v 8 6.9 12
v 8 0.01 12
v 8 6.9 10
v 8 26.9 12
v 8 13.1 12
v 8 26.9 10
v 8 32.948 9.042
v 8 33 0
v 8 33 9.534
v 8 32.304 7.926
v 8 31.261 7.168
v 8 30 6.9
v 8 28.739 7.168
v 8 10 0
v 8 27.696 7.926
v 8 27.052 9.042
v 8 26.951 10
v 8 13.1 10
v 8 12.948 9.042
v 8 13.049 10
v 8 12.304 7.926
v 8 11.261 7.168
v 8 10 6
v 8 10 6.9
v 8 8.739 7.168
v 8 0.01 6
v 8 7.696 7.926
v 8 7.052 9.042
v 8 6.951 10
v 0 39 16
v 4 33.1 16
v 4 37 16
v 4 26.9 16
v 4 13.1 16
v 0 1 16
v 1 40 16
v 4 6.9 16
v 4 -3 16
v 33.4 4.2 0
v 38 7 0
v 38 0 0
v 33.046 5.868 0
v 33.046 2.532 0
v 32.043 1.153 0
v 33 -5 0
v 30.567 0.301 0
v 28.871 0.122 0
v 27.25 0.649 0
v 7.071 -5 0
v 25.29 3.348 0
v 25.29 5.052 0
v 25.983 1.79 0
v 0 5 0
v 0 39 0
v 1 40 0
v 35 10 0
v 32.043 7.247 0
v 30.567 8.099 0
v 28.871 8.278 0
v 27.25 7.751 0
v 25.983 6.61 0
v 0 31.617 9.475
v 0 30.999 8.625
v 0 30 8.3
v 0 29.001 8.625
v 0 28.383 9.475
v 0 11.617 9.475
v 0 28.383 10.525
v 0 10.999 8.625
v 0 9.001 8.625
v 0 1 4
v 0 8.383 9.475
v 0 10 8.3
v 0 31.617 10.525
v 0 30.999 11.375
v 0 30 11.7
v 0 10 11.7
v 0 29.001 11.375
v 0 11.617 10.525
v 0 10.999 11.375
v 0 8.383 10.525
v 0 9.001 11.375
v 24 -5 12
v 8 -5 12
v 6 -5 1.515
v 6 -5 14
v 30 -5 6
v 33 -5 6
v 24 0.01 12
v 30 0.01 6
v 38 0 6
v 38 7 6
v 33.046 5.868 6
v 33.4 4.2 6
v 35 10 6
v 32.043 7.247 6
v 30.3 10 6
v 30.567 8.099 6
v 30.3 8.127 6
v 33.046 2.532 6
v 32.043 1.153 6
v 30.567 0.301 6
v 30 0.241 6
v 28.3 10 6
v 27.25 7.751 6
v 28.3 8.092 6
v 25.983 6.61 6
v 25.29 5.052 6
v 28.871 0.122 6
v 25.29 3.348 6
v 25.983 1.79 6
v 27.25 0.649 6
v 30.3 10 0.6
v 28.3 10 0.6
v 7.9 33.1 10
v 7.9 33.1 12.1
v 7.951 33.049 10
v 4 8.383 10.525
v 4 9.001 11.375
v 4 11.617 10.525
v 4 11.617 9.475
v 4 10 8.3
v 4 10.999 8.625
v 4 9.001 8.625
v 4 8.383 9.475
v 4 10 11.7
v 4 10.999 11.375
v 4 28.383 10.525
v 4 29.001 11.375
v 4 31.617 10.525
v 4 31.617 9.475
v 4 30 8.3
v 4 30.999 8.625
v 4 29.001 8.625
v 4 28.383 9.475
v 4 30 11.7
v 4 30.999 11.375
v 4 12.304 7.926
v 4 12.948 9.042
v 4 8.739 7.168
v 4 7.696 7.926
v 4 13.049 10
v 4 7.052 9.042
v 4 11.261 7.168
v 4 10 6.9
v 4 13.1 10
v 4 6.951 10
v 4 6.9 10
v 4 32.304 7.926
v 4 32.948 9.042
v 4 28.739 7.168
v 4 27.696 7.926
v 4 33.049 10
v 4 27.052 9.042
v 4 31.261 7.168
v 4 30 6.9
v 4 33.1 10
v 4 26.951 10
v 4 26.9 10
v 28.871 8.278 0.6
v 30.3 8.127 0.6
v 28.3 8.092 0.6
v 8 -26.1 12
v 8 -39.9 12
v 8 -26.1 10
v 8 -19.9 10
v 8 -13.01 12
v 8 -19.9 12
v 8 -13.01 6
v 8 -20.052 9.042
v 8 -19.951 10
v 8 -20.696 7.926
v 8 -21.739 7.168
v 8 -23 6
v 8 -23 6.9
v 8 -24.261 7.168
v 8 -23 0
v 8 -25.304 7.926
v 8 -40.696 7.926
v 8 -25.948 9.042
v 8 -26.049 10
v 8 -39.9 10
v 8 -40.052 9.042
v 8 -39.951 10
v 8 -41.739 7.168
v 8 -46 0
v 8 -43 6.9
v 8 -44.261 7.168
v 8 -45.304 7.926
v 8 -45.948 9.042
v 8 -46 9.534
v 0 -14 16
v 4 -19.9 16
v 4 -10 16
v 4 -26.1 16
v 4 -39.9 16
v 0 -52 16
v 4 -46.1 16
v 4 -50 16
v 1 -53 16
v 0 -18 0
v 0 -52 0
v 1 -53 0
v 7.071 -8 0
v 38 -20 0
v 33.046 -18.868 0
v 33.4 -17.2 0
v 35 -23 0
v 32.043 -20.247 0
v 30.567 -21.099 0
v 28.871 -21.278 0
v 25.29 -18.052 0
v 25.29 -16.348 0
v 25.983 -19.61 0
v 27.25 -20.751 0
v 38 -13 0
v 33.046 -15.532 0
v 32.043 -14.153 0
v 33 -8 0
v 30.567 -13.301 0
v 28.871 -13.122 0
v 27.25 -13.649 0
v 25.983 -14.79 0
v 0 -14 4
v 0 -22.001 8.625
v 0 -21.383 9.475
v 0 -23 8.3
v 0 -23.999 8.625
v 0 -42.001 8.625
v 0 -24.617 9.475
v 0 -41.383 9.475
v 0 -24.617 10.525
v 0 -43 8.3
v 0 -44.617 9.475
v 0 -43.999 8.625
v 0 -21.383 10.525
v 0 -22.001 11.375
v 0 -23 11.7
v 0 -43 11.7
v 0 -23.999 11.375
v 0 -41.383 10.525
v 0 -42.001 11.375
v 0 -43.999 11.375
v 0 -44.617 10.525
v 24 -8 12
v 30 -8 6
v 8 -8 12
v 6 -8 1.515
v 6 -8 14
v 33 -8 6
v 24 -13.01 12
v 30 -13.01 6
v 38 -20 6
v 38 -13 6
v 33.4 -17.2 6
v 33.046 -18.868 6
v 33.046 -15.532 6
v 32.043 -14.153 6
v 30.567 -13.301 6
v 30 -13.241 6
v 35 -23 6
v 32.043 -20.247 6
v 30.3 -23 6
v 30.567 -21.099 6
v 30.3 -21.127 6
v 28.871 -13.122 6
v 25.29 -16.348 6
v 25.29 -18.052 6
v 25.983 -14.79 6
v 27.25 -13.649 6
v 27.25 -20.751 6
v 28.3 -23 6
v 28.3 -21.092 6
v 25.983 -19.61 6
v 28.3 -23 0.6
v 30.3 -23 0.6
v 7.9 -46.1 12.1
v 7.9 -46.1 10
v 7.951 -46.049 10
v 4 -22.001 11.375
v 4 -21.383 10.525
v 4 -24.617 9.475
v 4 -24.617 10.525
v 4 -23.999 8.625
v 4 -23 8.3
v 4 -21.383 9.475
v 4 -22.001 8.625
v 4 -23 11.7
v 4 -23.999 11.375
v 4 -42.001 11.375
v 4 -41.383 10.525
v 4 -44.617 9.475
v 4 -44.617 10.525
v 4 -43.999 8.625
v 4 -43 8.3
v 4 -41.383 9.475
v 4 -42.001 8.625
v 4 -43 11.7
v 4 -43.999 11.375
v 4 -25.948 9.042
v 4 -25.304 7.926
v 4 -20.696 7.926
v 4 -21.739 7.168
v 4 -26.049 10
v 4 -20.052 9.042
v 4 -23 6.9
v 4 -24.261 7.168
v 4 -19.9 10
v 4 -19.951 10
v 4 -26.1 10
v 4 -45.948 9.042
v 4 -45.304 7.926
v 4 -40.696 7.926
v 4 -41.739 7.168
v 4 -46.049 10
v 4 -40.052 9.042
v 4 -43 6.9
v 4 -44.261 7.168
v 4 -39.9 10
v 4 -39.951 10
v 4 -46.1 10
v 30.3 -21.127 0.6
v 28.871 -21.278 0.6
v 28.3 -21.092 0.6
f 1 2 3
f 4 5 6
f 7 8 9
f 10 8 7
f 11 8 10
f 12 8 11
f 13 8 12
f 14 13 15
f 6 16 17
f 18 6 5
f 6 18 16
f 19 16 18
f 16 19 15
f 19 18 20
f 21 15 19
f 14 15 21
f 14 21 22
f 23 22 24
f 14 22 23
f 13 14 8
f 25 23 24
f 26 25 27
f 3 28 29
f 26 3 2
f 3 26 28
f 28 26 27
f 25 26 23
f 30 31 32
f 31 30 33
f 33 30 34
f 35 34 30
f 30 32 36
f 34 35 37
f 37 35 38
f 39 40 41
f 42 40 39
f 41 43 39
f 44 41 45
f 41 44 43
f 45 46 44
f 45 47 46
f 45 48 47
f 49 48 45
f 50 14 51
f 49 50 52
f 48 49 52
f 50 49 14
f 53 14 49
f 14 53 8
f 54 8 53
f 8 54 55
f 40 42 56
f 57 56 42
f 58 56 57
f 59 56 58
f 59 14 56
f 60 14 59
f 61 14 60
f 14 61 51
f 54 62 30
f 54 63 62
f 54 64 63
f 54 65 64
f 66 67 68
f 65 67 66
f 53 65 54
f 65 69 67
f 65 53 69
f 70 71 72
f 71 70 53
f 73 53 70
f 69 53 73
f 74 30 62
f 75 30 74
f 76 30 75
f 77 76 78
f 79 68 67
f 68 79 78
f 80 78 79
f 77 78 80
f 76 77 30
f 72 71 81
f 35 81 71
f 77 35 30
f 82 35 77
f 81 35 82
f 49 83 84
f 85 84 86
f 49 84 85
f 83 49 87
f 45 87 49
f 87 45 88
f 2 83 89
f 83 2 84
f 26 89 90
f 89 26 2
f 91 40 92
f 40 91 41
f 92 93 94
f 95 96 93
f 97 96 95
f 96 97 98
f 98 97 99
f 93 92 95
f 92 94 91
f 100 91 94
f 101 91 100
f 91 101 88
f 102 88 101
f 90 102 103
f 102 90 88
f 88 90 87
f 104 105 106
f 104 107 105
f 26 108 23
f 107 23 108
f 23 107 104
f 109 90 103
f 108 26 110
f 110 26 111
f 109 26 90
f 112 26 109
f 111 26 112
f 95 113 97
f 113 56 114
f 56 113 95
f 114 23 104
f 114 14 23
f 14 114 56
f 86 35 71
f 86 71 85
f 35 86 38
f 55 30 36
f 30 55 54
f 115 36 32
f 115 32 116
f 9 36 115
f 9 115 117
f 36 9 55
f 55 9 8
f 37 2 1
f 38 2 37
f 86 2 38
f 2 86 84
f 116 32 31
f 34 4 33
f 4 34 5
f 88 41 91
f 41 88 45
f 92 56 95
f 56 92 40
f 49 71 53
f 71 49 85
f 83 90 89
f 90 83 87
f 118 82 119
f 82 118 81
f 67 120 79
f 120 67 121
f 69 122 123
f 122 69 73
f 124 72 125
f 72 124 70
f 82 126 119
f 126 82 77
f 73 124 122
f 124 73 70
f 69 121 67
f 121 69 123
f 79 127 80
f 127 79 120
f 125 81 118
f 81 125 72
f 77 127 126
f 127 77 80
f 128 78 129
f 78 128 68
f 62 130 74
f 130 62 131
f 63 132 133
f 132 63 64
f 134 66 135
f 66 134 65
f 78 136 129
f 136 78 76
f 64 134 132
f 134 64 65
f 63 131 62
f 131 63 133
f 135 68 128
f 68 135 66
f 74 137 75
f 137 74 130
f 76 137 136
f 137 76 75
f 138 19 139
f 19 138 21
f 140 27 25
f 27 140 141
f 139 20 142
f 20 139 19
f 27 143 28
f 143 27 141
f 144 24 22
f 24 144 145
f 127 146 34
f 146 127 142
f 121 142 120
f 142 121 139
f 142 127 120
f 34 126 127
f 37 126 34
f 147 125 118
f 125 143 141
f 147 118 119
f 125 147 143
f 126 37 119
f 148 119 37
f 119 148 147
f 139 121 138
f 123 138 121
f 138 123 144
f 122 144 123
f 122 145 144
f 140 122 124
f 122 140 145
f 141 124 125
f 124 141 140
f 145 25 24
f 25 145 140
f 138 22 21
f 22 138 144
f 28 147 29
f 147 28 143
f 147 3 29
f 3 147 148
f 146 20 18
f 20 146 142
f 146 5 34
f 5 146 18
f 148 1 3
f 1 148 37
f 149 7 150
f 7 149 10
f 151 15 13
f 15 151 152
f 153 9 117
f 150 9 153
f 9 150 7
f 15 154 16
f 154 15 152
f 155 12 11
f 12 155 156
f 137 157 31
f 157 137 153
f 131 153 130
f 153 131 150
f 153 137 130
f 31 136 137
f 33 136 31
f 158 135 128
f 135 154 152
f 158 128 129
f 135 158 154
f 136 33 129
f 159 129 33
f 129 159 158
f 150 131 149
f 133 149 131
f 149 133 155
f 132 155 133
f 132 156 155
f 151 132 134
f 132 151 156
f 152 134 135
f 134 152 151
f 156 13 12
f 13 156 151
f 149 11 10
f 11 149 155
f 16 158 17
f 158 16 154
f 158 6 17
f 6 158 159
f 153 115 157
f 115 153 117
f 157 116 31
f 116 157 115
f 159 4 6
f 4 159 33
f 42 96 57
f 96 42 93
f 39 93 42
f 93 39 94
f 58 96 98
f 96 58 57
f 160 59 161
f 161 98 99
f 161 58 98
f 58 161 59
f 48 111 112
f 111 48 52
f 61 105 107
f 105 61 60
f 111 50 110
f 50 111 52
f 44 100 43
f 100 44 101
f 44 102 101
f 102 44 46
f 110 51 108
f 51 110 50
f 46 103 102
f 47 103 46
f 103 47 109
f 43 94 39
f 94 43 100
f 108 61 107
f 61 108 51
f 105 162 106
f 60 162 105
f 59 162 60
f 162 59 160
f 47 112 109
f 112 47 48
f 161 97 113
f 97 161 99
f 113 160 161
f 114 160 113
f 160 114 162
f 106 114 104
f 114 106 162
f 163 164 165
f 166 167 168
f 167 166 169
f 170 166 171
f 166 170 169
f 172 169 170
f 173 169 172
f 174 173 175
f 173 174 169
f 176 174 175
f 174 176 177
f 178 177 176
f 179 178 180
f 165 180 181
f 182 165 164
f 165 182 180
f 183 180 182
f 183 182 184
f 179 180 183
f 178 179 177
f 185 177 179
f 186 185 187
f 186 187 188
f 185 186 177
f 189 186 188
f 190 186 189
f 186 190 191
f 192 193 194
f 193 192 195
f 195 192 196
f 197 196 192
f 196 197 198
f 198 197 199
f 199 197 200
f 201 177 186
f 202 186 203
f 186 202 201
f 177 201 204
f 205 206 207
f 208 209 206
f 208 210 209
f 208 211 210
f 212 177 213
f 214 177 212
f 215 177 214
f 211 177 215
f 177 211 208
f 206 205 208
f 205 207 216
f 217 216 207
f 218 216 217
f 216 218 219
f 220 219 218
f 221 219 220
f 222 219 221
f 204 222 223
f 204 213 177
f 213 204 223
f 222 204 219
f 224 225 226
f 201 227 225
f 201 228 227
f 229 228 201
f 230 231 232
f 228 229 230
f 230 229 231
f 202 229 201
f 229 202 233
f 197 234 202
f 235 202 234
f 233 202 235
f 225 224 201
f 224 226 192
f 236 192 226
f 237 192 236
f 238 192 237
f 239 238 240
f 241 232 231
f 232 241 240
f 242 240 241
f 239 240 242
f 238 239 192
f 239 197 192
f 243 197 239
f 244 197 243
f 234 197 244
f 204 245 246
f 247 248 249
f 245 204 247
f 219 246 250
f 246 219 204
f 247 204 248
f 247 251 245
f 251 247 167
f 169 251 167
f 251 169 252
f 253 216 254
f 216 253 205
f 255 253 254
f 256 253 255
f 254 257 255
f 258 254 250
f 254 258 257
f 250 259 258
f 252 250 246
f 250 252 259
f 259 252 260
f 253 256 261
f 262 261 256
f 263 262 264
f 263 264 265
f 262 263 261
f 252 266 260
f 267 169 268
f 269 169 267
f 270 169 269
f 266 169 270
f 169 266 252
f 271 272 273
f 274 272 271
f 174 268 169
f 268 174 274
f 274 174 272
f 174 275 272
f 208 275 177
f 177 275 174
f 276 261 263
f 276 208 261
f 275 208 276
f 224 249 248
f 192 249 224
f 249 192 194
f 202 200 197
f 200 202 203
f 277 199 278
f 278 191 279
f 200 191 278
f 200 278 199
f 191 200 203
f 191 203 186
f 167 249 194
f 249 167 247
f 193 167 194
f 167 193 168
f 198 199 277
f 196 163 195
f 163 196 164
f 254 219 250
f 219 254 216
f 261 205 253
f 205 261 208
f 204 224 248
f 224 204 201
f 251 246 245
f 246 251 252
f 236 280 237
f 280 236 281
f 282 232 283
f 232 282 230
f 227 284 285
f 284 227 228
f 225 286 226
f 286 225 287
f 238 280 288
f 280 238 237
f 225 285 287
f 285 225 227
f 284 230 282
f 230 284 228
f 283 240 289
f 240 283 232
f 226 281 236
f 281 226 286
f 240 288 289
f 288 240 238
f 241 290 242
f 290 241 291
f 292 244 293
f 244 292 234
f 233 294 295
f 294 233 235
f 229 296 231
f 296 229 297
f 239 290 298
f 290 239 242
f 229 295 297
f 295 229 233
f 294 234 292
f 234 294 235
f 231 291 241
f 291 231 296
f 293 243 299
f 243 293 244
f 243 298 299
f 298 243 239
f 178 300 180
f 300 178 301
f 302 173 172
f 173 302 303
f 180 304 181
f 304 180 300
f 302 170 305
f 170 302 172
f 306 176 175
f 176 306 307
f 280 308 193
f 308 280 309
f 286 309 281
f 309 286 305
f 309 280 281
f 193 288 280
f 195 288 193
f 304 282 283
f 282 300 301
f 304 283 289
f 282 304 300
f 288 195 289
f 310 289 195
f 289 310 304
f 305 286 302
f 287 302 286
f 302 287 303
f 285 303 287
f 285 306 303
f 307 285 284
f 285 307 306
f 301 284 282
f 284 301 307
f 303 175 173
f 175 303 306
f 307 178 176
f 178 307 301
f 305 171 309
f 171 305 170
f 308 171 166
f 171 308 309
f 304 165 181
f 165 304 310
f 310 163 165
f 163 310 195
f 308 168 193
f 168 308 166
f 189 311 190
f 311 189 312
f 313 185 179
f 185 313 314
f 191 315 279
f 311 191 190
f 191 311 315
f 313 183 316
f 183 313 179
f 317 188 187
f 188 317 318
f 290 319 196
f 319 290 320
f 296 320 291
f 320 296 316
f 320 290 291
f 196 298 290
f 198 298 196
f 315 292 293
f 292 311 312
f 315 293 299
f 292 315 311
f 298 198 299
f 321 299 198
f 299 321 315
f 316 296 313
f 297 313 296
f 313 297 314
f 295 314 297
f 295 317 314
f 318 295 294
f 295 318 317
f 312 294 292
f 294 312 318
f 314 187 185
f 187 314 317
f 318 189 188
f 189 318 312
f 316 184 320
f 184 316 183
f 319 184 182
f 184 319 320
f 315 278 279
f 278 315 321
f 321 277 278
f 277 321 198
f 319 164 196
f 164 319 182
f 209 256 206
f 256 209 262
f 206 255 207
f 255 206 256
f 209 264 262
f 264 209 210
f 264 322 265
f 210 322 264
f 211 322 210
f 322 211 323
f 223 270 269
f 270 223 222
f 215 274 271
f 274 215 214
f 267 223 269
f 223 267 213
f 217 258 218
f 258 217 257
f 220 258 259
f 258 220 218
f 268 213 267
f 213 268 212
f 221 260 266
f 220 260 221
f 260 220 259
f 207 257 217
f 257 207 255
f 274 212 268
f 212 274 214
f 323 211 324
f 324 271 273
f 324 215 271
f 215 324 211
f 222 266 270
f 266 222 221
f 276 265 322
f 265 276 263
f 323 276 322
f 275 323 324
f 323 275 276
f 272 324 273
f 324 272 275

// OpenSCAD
// PRUSA iteration3
// Z axis top holder
// GNU GPL v3
// Josef Průša <iam@josefprusa.cz> and contributors
// http://www.reprap.org/wiki/Prusa_Mendel
// http://prusamendel.org

module z_top_base() {
  translate([0,-5,0]) cube([8,45,16]); // plate touching the base
  translate([0,-5,0]) cube([30,5.01,12]); // plate touching the base
  translate([0,-5,0]) cube([38,15,5+1]); // plate touching the base
}

module z_top_fancy() {
  // Corner cutouts
  translate([0.5,0.5,0]) rotate([0,0,-45-180]) translate([-15,0,-1]) cube([30,30,51]);
  translate([0.5,40-0.5,0]) rotate([0,0,-45+90]) translate([-15,0,-1]) cube([30,30,51]);
  translate([-4,40+5,0]) rotate([0,0,-45-0]) translate([0,0,-1]) cube([30,30,51]);
  translate([8,0,12]) rotate([0,-45,0]) translate([0,-5,0]) cube([30,50,30]);
  translate([38-2.5,-5+2.5,0]) rotate([0,0,-45-90]) translate([-15,0,-1]) cube([30,30,51]);
  translate([38-1.5,10-1.5,0]) rotate([0,0,-45]) translate([-15,0,-1]) cube([30,30,51]);
  translate([0,0,5]) rotate([45+180,0,0]) rotate([0,0,-45+90]) translate([0,0,-15]) cube([30,30,30]);

  // Stiffner cut out
  translate([30,0,6]) rotate([0,-45,0]) translate([0,-5,0]) cube([30,50,30]);
}

module z_top_holes() {
  // Screw holes
  translate([-1,10,10]) rotate([0,90,0]) cylinder(h = 20, r = 1.7, $fn = 10);
  translate([-1,10+20,10]) rotate([0,90,0]) cylinder(h = 20, r = 1.7, $fn = 10);

  // Screw heads
  translate([4,10,10]) rotate([0,90,0]) cylinder(h = 20, r = 3.1, $fn = 15);
  translate([4,10-3.1,10]) cube([10,6.2,10]);
  translate([4,10+20,10]) rotate([0,90,0]) cylinder(h = 20, r = 3.1, $fn = 15);
  translate([4,10+20-3.1,10]) cube([10,6.2,10]);

  // Z rod holder
  translate([25+4.3,4.2,-1]) rotate([0,0,0]) cylinder(h = 50, r = 4.1, $fn = 15);
  translate([25+4.3-1,3,0.6]) cube([2,10,7]); // it's bit up because it helps with printing
}

// Final part
module z_top() {
  difference(){
    z_top_base();
    z_top_fancy();
    z_top_holes();
  }
  translate([0,-13,0]) mirror([0,1,0]) difference() {
    z_top_base();
    z_top_fancy();
    z_top_holes();
  }
}

z_top();
